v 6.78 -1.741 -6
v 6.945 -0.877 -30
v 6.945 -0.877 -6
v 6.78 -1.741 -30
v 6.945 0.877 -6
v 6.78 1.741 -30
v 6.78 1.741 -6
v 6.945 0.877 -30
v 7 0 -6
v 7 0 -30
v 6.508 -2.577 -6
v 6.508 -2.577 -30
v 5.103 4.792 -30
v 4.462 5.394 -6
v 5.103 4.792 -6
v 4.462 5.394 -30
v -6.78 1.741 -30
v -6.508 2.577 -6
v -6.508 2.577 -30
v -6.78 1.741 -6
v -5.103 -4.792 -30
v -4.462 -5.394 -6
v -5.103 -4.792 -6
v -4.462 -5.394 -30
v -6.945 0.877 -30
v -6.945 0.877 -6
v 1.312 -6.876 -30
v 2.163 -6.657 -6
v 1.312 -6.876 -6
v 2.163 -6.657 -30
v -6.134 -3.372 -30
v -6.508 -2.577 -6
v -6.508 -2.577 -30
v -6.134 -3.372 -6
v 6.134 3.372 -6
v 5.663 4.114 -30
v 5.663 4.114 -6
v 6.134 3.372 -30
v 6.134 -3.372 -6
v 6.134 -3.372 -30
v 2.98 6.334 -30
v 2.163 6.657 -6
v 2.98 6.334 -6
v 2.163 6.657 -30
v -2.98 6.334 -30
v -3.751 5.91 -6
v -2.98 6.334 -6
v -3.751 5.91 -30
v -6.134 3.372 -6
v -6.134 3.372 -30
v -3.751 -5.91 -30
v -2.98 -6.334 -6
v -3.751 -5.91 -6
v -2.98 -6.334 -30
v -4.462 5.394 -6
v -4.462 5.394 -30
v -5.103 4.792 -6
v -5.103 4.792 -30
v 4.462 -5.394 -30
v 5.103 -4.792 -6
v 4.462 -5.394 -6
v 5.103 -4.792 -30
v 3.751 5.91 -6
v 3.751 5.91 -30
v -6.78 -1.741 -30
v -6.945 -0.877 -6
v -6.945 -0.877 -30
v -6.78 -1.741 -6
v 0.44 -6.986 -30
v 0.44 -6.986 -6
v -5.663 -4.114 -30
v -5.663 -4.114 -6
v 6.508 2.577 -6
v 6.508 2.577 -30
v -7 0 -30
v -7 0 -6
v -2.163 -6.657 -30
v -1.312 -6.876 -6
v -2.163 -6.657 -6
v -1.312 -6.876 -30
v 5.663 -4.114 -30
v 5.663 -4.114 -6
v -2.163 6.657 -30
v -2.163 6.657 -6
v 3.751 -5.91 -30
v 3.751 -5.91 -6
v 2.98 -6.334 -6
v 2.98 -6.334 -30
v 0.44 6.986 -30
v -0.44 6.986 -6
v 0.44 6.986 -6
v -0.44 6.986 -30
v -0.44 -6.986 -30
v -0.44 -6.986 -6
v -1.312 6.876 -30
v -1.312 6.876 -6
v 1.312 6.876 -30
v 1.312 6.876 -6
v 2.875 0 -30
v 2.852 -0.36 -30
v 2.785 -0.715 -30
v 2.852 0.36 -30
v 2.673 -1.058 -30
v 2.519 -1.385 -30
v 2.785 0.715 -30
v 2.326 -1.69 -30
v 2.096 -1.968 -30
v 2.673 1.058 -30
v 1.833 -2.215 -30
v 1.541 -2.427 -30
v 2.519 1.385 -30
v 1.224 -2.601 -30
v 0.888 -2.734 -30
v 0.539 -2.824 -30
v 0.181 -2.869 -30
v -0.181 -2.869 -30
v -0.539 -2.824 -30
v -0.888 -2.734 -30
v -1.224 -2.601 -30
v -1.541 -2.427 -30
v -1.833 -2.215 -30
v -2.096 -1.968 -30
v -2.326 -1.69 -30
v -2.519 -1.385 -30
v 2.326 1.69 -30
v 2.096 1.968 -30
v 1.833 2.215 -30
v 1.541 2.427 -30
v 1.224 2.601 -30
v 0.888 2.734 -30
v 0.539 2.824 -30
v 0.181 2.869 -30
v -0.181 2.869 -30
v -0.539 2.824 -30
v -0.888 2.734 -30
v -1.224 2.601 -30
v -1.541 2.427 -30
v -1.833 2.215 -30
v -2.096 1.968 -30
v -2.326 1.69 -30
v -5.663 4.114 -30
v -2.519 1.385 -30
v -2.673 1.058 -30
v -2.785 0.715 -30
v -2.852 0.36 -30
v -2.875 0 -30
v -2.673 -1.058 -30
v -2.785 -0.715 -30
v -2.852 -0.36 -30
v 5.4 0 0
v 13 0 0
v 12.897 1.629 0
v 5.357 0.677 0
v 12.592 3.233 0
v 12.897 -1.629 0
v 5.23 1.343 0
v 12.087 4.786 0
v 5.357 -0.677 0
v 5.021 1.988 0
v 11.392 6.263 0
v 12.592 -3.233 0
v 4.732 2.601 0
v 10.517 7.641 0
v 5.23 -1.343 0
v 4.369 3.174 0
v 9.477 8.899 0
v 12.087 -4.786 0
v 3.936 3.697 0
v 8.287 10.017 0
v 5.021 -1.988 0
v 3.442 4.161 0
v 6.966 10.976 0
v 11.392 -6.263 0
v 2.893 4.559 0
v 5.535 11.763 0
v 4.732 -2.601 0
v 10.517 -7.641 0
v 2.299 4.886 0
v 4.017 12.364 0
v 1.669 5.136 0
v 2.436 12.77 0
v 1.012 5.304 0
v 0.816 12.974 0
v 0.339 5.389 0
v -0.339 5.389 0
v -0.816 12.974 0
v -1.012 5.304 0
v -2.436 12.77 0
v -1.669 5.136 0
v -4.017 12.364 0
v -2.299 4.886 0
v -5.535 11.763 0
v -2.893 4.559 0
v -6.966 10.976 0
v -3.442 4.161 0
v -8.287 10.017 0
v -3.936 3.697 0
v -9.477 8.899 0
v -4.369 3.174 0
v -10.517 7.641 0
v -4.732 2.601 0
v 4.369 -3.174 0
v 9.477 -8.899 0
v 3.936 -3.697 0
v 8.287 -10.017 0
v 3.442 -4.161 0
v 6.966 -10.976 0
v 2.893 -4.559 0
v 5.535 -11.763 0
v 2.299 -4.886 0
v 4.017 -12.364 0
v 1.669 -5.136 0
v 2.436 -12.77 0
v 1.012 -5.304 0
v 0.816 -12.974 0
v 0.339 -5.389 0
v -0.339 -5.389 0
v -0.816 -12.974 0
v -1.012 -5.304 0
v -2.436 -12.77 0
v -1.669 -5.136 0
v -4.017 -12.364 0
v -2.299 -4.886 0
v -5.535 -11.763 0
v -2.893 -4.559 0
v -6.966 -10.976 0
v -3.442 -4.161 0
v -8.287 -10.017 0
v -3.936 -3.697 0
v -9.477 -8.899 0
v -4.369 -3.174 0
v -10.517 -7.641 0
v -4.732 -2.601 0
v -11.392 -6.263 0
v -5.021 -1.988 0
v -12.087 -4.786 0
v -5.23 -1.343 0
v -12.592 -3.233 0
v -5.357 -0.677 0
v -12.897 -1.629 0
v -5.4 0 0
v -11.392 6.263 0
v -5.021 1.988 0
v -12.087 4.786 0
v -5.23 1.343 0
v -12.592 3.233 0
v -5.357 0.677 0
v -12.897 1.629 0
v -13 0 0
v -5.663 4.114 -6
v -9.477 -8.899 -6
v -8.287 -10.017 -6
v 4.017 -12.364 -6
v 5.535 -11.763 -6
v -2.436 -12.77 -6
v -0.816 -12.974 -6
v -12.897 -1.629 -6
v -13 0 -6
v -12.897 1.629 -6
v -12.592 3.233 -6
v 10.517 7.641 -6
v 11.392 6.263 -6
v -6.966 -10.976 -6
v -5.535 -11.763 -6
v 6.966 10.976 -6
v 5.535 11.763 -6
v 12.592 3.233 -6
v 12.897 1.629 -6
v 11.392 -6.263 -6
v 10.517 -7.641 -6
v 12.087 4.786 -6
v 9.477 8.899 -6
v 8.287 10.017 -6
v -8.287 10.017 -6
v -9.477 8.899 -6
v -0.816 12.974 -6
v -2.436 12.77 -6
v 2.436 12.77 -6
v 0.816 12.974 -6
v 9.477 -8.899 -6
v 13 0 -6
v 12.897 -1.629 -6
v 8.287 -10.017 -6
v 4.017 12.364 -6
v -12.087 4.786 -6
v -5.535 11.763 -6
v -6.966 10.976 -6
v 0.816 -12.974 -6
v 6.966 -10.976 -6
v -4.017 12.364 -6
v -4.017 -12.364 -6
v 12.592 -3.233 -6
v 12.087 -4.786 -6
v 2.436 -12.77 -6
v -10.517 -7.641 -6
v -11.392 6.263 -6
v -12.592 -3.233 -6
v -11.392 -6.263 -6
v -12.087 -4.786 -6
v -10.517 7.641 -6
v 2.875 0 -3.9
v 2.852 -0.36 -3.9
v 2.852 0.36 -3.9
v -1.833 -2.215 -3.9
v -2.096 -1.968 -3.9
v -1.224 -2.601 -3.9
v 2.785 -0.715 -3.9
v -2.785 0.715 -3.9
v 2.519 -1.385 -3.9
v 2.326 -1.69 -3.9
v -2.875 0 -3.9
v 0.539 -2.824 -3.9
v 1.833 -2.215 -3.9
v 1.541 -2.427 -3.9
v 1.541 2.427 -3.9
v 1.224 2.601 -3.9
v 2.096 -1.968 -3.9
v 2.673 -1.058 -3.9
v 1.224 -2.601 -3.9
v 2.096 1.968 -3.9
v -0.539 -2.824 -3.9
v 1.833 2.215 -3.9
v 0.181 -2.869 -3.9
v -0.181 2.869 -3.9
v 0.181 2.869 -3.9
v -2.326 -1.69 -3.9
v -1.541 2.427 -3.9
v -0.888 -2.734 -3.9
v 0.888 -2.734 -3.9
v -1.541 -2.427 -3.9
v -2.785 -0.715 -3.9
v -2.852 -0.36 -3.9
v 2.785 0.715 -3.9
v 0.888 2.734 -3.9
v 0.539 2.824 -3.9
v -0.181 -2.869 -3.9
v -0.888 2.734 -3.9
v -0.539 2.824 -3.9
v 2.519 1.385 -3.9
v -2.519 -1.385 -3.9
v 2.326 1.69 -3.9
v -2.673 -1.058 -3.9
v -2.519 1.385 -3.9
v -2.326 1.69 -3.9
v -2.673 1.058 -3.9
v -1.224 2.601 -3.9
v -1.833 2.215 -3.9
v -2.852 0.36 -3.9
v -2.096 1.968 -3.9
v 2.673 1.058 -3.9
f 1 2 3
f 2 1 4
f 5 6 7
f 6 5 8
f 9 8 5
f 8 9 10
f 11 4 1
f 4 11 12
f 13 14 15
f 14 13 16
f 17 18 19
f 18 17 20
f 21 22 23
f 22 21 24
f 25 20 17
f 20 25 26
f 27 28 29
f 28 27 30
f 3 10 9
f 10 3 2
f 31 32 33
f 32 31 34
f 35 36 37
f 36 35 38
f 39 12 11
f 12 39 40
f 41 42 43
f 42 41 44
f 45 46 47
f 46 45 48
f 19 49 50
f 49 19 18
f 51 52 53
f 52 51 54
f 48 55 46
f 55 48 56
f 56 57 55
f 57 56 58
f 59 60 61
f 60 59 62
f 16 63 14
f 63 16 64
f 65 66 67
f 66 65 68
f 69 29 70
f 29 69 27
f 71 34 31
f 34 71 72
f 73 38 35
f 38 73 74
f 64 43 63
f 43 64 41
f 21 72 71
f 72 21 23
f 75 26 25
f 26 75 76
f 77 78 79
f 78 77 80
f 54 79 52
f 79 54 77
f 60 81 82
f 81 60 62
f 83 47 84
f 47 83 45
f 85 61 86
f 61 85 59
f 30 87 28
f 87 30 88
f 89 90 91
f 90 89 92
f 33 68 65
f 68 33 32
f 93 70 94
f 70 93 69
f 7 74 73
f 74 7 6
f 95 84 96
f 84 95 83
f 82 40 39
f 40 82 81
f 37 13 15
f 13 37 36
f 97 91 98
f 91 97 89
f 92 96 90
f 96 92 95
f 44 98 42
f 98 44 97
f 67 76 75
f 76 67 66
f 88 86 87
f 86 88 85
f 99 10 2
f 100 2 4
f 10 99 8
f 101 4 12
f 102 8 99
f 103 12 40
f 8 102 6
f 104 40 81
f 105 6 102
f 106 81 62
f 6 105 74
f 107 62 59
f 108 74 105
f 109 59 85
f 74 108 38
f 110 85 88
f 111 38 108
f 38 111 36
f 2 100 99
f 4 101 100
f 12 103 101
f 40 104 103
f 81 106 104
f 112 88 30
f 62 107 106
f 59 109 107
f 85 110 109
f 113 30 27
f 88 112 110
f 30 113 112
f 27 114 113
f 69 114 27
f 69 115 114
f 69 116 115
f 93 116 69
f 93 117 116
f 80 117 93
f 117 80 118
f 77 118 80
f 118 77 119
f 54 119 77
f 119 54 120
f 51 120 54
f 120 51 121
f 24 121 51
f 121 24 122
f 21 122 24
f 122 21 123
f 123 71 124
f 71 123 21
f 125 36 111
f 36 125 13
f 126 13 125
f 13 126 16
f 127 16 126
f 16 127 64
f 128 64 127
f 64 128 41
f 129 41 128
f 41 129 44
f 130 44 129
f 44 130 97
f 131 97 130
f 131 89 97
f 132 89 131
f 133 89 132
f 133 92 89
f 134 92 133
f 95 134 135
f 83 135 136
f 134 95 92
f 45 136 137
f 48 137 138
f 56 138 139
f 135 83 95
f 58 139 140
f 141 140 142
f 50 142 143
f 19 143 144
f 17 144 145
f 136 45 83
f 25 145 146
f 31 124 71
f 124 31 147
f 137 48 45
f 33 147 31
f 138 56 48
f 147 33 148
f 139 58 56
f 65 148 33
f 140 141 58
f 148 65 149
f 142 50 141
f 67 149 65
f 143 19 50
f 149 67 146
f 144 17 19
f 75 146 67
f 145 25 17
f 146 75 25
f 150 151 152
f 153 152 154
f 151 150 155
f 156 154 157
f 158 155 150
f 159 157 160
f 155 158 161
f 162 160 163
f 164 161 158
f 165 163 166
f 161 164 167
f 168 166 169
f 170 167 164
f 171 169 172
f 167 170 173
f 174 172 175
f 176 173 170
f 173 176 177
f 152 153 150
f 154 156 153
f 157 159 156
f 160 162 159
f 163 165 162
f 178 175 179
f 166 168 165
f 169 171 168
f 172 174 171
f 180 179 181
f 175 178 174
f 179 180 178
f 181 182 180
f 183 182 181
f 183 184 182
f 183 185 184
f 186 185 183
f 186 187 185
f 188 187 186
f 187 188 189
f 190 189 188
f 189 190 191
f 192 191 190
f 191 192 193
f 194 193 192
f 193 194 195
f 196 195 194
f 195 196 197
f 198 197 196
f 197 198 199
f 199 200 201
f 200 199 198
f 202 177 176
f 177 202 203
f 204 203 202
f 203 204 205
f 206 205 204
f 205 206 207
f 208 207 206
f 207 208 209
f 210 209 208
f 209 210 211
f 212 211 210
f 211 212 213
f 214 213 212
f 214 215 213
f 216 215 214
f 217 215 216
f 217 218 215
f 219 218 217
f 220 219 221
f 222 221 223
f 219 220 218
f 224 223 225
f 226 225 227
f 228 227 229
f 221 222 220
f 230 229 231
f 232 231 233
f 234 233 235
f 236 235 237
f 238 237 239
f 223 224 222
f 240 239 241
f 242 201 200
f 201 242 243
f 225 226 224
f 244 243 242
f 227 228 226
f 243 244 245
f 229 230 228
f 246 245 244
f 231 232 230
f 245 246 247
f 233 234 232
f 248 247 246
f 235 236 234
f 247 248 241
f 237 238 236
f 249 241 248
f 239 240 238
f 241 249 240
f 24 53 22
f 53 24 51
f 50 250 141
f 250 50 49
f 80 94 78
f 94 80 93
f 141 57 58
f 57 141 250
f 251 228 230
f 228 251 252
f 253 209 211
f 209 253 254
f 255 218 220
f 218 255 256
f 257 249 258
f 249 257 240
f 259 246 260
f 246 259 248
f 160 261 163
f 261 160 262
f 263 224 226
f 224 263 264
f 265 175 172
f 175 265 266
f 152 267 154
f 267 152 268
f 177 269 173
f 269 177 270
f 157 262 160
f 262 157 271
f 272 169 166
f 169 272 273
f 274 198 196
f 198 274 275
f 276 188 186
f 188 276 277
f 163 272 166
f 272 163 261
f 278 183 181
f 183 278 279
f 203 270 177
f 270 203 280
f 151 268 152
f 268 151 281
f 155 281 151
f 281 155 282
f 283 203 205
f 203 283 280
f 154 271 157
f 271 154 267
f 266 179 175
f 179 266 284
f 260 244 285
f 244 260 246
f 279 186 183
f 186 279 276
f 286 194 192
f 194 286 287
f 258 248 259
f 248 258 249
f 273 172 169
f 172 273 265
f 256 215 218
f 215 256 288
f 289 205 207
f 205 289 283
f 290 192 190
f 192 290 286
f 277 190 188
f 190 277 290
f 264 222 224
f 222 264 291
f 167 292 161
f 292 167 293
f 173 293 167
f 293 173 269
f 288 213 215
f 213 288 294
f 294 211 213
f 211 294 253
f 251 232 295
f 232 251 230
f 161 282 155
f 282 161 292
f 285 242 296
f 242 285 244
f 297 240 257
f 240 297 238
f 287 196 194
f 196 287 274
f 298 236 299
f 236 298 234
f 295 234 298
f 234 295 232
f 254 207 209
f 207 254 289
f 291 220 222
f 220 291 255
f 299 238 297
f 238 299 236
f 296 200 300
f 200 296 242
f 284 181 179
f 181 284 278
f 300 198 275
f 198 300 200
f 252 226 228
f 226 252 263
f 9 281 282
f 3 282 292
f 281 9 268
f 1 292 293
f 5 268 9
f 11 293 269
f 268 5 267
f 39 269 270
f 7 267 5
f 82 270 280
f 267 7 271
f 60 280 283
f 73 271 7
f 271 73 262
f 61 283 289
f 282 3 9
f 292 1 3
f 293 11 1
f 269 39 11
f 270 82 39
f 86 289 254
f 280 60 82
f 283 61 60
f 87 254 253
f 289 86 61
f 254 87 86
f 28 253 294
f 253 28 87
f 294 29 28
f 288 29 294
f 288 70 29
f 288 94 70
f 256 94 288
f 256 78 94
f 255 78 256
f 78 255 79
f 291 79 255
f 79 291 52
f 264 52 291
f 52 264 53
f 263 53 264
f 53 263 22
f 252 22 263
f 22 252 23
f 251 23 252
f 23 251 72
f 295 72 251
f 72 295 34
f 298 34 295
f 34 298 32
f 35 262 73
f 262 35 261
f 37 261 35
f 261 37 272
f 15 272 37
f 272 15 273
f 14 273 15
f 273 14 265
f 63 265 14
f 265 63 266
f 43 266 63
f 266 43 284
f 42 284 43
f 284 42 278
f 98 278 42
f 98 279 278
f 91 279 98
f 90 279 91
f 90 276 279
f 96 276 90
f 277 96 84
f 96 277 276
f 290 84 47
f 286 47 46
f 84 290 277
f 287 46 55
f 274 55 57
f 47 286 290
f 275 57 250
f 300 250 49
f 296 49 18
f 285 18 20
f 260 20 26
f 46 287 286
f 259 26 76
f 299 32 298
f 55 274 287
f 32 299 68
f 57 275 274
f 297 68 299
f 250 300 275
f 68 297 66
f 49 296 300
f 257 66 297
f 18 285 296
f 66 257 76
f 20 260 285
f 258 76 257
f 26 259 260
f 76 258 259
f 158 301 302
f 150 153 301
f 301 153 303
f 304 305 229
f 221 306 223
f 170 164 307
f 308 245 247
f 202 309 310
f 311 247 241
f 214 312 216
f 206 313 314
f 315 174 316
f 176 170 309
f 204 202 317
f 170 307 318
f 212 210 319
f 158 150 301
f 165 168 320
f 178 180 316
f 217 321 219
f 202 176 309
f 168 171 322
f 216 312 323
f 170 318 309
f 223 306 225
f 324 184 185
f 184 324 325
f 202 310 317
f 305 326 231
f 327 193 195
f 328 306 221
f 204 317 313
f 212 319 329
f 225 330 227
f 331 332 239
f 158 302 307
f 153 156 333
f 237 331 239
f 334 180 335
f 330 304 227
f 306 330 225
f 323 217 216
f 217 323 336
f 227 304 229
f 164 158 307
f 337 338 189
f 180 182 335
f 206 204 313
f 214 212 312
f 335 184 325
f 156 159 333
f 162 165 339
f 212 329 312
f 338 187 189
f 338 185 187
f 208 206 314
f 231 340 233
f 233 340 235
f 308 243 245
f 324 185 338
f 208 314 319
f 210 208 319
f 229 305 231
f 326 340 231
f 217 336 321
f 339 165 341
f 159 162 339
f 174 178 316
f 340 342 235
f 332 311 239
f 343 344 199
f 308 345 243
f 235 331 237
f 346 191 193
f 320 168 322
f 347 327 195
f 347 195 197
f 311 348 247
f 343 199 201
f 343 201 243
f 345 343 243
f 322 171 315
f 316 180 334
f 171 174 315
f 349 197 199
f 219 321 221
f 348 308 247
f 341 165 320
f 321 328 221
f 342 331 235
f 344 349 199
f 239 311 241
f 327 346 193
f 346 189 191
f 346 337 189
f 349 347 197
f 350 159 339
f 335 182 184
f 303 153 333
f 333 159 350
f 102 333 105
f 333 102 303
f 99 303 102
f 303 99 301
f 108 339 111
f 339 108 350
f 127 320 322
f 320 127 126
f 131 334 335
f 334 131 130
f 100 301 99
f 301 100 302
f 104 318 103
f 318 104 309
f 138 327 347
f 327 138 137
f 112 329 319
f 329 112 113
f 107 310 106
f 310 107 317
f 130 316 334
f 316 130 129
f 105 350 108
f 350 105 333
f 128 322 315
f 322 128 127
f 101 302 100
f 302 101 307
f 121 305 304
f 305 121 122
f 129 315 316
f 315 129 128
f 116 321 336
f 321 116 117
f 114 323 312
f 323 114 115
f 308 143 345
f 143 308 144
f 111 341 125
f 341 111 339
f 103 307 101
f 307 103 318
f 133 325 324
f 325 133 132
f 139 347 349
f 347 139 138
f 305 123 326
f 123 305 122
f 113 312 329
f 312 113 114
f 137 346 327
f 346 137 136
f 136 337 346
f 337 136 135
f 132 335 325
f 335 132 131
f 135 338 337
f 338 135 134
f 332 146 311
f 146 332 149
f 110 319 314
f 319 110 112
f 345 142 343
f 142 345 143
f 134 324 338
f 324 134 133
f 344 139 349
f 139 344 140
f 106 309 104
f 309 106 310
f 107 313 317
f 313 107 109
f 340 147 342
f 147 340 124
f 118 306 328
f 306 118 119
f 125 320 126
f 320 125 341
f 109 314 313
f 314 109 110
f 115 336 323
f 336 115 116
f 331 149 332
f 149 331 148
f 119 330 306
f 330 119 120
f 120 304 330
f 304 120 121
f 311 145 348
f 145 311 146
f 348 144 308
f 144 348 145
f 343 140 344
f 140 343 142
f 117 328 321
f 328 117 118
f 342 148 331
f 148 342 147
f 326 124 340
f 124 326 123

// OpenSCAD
$fn = 50;


difference() {
	union() {
		translate(v = [0, 0, -30.0000000000]) {
			cylinder(h = 30, r = 7.0000000000);
		}
		translate(v = [0, 0, -6.0000000000]) {
			cylinder(h = 6, r = 13.0000000000);
		}
	}
	union() {
		translate(v = [0, 0, 0]) {
			rotate(a = [0, 0, 0]) {
				difference() {
					union() {
						#translate(v = [0, 0, -30.0000000000]) {
							cylinder(h = 30, r = 2.6000000000);
						}
						#translate(v = [0, 0, -3.9000000000]) {
							cylinder(h = 3.9000000000, r1 = 2.8750000000, r2 = 5.4000000000);
						}
						#translate(v = [0, 0, -30.0000000000]) {
							cylinder(h = 30, r = 2.8750000000);
						}
						#translate(v = [0, 0, -30.0000000000]) {
							cylinder(h = 30, r = 2.6000000000);
						}
					}
					union();
				}
			}
		}
	}
}
